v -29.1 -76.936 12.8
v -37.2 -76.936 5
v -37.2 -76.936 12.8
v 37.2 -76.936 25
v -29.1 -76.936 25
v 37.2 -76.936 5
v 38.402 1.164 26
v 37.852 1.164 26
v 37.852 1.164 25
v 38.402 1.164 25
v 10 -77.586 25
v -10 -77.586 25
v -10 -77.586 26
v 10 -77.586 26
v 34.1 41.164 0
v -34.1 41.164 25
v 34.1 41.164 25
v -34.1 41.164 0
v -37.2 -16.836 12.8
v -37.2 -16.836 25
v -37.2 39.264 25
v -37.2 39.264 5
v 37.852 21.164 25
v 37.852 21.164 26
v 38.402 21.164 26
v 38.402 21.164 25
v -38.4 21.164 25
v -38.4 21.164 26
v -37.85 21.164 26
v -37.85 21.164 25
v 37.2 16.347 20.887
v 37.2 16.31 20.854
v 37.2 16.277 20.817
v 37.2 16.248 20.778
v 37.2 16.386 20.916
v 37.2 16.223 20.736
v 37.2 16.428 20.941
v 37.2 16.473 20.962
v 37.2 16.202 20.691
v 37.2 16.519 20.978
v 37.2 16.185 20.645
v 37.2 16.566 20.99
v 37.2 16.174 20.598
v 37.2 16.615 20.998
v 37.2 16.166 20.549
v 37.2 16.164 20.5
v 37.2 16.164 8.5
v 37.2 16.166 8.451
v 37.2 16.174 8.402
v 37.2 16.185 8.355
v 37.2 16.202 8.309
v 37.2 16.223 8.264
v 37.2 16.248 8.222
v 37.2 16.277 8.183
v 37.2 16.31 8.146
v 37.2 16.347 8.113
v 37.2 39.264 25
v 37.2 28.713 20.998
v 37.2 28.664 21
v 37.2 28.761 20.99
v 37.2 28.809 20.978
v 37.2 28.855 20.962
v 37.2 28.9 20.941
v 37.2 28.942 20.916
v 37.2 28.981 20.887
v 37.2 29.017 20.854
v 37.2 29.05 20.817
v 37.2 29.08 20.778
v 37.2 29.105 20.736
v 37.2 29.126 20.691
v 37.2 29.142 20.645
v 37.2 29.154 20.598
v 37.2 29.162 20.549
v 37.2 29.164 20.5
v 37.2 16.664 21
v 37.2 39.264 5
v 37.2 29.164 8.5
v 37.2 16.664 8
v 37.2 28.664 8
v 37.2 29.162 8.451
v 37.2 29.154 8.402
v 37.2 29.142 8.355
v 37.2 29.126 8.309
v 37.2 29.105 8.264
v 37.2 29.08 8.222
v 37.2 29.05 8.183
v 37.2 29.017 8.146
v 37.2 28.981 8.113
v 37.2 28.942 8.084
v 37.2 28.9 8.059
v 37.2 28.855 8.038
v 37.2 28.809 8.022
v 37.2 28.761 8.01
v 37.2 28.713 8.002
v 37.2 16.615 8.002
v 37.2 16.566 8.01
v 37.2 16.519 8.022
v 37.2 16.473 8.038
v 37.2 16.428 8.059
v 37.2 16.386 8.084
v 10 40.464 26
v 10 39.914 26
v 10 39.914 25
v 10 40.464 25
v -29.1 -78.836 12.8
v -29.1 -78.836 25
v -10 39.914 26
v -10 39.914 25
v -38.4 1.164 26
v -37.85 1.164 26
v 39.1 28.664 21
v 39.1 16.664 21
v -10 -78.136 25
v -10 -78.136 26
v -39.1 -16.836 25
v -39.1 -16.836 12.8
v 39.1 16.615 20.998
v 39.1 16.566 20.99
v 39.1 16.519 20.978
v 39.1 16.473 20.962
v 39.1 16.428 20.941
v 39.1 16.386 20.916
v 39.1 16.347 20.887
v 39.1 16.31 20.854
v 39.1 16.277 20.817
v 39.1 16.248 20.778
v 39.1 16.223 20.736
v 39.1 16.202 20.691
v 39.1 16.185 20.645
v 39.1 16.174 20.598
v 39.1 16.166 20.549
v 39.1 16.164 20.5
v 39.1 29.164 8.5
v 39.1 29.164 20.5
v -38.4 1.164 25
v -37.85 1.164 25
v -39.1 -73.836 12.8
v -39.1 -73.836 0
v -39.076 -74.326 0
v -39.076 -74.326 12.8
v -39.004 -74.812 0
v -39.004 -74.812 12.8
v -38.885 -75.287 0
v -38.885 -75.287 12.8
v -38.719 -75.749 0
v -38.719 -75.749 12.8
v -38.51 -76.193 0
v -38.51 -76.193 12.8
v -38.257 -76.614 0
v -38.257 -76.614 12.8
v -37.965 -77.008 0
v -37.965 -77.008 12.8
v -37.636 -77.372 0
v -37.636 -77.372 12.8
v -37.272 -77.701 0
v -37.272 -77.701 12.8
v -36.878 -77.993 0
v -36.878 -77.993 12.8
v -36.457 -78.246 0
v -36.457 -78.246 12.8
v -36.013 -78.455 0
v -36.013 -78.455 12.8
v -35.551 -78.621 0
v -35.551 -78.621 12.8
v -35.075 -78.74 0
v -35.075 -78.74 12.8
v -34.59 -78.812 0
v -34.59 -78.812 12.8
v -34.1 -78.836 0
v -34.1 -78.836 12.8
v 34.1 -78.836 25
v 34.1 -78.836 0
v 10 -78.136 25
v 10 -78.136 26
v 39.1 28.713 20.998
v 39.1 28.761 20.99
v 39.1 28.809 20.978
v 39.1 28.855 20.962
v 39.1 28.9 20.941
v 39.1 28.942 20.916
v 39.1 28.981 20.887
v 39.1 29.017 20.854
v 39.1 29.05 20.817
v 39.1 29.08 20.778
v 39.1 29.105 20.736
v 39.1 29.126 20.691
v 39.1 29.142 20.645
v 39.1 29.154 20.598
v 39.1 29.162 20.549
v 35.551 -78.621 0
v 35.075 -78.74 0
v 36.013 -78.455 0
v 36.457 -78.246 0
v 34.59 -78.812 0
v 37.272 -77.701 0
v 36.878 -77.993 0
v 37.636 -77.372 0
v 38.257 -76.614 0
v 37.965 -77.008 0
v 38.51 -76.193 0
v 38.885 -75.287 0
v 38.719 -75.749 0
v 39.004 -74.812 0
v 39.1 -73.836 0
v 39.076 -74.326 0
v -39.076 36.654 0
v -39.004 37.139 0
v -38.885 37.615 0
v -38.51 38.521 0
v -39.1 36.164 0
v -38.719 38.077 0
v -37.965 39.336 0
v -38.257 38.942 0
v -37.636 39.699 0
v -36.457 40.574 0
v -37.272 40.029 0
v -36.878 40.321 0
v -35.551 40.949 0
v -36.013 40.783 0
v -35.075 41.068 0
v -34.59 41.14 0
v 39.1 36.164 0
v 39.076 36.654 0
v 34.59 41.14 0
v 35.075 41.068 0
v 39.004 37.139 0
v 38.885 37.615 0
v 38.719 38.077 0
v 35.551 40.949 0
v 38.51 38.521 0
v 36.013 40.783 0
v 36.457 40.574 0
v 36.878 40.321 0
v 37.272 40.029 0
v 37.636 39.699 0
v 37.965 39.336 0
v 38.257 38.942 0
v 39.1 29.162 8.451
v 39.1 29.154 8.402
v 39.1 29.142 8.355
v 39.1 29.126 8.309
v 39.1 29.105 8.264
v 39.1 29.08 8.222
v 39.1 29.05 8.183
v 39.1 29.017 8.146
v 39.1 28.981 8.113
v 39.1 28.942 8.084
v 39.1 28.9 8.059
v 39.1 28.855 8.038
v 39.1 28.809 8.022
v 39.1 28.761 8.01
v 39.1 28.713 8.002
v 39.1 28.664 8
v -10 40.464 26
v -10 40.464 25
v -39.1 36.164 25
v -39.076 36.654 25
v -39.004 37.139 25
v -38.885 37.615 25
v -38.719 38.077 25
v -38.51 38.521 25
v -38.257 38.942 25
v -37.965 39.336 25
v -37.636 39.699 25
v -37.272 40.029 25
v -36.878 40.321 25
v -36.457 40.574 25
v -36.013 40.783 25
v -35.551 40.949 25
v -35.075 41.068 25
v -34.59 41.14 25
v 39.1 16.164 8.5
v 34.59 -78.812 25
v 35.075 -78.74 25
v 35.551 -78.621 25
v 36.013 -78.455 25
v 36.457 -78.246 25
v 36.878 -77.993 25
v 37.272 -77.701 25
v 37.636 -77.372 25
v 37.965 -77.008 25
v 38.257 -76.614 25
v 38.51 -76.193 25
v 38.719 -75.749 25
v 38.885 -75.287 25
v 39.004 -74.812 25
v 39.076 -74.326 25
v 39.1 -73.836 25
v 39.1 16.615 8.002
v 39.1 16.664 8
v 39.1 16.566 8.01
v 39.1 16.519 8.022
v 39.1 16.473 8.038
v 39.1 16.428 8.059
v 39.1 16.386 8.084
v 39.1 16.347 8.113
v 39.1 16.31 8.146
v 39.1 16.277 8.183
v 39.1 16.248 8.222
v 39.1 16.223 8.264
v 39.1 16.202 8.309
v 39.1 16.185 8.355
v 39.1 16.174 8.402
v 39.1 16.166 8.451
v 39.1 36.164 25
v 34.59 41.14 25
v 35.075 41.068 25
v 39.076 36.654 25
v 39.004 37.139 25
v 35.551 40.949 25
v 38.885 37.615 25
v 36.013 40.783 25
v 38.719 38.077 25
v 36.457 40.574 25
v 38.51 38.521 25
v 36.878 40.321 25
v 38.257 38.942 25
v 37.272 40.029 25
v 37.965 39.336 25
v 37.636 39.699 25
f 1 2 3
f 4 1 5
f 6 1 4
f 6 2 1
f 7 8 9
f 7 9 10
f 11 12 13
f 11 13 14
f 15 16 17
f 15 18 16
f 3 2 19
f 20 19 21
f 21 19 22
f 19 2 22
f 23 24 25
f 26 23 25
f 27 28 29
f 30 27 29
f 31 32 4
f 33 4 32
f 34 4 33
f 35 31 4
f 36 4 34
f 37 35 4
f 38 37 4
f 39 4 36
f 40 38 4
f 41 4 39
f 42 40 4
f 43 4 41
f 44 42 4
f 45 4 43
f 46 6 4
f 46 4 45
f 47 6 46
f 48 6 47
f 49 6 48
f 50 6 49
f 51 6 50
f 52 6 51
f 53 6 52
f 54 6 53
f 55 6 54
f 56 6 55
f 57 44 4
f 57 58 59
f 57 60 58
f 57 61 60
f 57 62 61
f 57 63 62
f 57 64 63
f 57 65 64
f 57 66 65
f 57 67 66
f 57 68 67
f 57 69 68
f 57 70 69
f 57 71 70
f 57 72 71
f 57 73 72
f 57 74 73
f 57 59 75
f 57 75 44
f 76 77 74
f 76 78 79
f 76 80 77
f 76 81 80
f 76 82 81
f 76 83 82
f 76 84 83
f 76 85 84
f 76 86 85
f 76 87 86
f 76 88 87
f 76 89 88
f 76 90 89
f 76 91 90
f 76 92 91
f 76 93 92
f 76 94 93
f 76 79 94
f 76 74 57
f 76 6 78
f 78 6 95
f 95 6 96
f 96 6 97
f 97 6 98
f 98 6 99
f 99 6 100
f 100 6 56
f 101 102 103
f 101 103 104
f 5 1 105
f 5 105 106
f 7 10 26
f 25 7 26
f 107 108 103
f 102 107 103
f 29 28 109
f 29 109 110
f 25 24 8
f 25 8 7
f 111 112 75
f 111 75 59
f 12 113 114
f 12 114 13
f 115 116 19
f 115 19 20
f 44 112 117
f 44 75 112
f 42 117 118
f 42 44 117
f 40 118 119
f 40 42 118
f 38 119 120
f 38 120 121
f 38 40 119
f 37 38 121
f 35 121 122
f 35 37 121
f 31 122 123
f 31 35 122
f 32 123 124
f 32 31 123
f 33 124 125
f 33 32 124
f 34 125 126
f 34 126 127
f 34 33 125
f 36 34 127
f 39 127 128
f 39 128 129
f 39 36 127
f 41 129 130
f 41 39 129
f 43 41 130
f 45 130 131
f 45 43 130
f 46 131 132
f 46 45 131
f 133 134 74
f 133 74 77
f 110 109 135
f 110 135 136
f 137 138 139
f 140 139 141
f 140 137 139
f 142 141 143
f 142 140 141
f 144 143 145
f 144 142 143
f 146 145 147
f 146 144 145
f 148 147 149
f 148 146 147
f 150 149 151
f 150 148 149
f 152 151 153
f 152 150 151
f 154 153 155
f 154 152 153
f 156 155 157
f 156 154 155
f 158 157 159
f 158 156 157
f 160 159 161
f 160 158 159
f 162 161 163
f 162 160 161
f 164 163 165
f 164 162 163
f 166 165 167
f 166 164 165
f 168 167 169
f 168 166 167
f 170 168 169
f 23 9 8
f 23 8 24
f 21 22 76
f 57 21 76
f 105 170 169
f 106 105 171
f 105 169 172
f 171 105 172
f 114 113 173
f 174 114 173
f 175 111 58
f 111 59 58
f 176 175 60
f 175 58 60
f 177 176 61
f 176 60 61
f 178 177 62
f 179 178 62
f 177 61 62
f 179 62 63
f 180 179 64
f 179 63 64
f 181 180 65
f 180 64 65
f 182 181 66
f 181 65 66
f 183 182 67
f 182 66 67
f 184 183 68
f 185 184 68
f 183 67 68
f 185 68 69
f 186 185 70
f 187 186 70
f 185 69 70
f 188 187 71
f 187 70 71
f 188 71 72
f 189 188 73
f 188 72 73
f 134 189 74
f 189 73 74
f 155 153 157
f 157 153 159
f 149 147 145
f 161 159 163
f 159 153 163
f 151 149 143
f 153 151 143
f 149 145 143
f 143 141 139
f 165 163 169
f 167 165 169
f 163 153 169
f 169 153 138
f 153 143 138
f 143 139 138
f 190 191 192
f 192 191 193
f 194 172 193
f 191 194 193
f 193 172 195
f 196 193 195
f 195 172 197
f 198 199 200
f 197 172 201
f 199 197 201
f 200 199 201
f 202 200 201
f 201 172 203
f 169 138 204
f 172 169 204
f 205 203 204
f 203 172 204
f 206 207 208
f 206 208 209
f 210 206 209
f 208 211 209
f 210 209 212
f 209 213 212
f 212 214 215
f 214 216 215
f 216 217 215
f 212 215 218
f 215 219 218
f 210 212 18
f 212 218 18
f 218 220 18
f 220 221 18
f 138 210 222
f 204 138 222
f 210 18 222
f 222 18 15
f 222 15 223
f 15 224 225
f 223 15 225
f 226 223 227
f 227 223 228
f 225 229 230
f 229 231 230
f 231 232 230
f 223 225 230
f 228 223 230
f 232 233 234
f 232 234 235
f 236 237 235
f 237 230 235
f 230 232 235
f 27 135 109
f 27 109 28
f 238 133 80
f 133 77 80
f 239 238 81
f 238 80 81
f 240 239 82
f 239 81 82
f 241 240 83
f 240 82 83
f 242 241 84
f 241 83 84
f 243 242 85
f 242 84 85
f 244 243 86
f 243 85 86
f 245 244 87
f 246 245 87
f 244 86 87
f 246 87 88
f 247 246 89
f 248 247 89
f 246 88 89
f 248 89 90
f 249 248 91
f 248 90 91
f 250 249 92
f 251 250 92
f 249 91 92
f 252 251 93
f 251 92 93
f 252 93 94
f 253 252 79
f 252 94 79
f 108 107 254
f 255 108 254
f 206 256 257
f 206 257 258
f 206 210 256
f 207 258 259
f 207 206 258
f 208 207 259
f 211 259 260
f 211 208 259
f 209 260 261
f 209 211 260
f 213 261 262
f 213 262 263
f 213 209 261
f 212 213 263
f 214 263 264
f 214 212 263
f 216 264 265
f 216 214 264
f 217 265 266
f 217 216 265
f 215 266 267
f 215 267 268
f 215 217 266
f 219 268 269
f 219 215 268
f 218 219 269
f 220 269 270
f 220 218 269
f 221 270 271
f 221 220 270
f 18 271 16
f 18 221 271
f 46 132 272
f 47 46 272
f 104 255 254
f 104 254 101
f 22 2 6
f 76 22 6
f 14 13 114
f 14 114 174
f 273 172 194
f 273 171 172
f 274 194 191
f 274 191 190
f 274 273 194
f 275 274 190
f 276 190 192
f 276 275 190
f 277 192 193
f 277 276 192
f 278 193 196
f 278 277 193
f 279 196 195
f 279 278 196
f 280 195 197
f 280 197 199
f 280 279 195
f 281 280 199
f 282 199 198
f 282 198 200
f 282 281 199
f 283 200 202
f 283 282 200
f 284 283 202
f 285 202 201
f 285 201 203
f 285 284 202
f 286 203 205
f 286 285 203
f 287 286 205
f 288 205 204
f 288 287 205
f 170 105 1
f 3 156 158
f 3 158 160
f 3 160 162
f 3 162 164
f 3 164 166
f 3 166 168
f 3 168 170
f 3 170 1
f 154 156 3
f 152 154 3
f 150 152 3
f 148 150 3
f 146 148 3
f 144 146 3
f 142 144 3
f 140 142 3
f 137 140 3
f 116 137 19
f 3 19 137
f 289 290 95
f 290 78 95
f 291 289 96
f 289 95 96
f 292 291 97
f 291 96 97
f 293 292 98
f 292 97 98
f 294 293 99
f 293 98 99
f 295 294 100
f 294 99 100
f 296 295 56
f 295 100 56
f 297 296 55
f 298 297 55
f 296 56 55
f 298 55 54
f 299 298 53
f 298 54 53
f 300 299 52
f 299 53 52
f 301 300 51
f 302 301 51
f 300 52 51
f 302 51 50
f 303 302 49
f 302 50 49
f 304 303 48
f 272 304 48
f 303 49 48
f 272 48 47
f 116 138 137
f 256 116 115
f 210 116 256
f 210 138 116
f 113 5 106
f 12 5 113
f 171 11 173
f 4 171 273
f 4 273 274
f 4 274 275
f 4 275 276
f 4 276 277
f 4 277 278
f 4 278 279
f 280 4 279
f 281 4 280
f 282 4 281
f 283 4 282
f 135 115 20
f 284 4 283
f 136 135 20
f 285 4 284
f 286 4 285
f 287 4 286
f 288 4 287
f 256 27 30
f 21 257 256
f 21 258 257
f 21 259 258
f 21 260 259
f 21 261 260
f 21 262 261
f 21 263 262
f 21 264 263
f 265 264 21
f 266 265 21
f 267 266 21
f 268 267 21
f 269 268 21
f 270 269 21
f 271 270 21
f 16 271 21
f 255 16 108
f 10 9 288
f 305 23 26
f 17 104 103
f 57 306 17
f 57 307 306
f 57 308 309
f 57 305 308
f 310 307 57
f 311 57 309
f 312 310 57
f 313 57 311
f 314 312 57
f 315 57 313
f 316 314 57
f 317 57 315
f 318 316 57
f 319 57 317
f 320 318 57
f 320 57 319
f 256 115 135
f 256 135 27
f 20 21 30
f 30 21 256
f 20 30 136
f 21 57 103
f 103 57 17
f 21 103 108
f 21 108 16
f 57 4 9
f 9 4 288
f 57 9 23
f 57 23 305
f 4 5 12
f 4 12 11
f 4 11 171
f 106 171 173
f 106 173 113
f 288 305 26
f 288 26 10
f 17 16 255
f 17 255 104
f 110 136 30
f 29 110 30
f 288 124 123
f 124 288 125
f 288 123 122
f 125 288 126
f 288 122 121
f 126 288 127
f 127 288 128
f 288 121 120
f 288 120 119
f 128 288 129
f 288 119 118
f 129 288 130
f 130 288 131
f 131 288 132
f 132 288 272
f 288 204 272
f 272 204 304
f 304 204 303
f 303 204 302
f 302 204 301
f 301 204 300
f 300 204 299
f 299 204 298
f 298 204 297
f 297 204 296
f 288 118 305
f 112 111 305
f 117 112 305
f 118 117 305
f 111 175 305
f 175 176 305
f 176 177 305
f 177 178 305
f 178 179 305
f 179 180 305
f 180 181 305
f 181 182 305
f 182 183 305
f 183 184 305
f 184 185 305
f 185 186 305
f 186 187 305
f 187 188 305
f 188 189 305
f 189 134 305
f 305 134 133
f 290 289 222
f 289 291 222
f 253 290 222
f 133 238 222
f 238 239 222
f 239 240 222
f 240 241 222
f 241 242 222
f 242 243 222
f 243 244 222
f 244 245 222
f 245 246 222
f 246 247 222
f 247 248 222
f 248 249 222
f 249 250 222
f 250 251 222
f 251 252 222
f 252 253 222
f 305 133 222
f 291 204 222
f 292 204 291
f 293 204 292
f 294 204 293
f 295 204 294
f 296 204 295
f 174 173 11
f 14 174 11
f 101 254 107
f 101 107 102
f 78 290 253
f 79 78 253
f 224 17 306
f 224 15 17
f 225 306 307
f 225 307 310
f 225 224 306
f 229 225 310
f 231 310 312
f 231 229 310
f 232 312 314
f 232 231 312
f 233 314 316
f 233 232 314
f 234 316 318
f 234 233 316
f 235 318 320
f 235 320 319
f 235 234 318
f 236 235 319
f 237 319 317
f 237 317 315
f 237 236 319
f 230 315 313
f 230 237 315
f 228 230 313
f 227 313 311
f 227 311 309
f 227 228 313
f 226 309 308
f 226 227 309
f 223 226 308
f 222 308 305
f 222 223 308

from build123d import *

# Parameters (mm, degrees)
SCHIZZO1_W                   = 78.2
SCHIZZO1_H                   = 120
ESTRUSIONE_ESTRUSIONE1_DEPTH = 5
SCHIZZO2_W                   = 78.2
SCHIZZO2_H                   = 120
SCHIZZO2_W_2                 = 74.4
SCHIZZO2_H_2                 = 116.2
ESTRUSIONE_ESTRUSIONE2_DEPTH = 20
SCHIZZO3_W                   = 0.55
SCHIZZO3_H                   = 20
SCHIZZO3_W_2                 = 20
SCHIZZO3_H_2                 = 0.55
ESTRUSIONE_ESTRUSIONE3_DEPTH = 1
SCHIZZO4_W                   = 13
SCHIZZO4_H                   = 13
TAGLIO_ESTRUSIONE1_DEPTH     = 4
RACCORDO1_R                  = 5
RACCORDO2_R                  = 0.5
SCHIZZO5_W                   = 12.2
SCHIZZO5_H                   = 62
TAGLIO_ESTRUSIONE2_DEPTH     = 10


with BuildPart() as part:
    # Schizzo1 → Estrusione-Estrusione1 (new body)
    with BuildSketch(Plane.XY):
        with Locations((0, -18.836070381)):
            Rectangle(SCHIZZO1_W, SCHIZZO1_H)
    extrude(amount=ESTRUSIONE_ESTRUSIONE1_DEPTH)

    # Schizzo2 → Estrusione-Estrusione2 (add)
    with BuildSketch(Plane.XY.offset(5)):
        with Locations((0, -18.836070381)):
            Rectangle(SCHIZZO2_W, SCHIZZO2_H)
        with Locations((0, -18.836070381)):
            Rectangle(SCHIZZO2_W_2, SCHIZZO2_H_2, mode=Mode.SUBTRACT)
    extrude(amount=ESTRUSIONE_ESTRUSIONE2_DEPTH)

    # Schizzo3 → Estrusione-Estrusione3 (add)
    with BuildSketch(Plane.XY.offset(25)):
        with Locations((-38.125, 11.163929619)):
            Rectangle(SCHIZZO3_W, SCHIZZO3_H)
        with Locations((38.127094898, 11.163929619)):
            Rectangle(SCHIZZO3_W, SCHIZZO3_H)
        with Locations((0, 40.188929619)):
            Rectangle(SCHIZZO3_W_2, SCHIZZO3_H_2)
        with Locations((0, -77.861070381)):
            Rectangle(SCHIZZO3_W_2, SCHIZZO3_H_2)
    extrude(amount=ESTRUSIONE_ESTRUSIONE3_DEPTH)

    # Schizzo4 → Taglio-Estrusione1 (cut)
    with BuildSketch(Plane(origin=(39.1, 0, 0), x_dir=(0, 0, -1), z_dir=(1, 0, 0))):
        with Locations((-14.5, 22.663929619)):
            Rectangle(SCHIZZO4_W, SCHIZZO4_H)
    extrude(amount=-TAGLIO_ESTRUSIONE1_DEPTH, mode=Mode.SUBTRACT)

    # Raccordo1
    raccordo1_edges = [part.edges().sort_by_distance(p)[0] for p in [
        (-39.1, 41.163929619, 12.5),
        (39.1, 41.163929619, 12.5),
        (39.1, -78.836070381, 12.5),
        (-39.1, -78.836070381, 12.5),
    ]]
    fillet(raccordo1_edges, radius=RACCORDO1_R)

    # Raccordo2
    raccordo2_edges = [part.edges().sort_by_distance(p)[0] for p in [
        (38.15, 16.163929619, 21),
        (38.15, 29.163929619, 21),
        (38.15, 29.163929619, 8),
        (38.15, 16.163929619, 8),
    ]]
    fillet(raccordo2_edges, radius=RACCORDO2_R)

    # Schizzo5 → Taglio-Estrusione2 (cut)
    with BuildSketch(Plane.ZY.offset(39.1)):
        with Locations((18.9, -47.836070381)):
            Rectangle(SCHIZZO5_W, SCHIZZO5_H)
    extrude(amount=-TAGLIO_ESTRUSIONE2_DEPTH, mode=Mode.SUBTRACT)


solid = part.part
